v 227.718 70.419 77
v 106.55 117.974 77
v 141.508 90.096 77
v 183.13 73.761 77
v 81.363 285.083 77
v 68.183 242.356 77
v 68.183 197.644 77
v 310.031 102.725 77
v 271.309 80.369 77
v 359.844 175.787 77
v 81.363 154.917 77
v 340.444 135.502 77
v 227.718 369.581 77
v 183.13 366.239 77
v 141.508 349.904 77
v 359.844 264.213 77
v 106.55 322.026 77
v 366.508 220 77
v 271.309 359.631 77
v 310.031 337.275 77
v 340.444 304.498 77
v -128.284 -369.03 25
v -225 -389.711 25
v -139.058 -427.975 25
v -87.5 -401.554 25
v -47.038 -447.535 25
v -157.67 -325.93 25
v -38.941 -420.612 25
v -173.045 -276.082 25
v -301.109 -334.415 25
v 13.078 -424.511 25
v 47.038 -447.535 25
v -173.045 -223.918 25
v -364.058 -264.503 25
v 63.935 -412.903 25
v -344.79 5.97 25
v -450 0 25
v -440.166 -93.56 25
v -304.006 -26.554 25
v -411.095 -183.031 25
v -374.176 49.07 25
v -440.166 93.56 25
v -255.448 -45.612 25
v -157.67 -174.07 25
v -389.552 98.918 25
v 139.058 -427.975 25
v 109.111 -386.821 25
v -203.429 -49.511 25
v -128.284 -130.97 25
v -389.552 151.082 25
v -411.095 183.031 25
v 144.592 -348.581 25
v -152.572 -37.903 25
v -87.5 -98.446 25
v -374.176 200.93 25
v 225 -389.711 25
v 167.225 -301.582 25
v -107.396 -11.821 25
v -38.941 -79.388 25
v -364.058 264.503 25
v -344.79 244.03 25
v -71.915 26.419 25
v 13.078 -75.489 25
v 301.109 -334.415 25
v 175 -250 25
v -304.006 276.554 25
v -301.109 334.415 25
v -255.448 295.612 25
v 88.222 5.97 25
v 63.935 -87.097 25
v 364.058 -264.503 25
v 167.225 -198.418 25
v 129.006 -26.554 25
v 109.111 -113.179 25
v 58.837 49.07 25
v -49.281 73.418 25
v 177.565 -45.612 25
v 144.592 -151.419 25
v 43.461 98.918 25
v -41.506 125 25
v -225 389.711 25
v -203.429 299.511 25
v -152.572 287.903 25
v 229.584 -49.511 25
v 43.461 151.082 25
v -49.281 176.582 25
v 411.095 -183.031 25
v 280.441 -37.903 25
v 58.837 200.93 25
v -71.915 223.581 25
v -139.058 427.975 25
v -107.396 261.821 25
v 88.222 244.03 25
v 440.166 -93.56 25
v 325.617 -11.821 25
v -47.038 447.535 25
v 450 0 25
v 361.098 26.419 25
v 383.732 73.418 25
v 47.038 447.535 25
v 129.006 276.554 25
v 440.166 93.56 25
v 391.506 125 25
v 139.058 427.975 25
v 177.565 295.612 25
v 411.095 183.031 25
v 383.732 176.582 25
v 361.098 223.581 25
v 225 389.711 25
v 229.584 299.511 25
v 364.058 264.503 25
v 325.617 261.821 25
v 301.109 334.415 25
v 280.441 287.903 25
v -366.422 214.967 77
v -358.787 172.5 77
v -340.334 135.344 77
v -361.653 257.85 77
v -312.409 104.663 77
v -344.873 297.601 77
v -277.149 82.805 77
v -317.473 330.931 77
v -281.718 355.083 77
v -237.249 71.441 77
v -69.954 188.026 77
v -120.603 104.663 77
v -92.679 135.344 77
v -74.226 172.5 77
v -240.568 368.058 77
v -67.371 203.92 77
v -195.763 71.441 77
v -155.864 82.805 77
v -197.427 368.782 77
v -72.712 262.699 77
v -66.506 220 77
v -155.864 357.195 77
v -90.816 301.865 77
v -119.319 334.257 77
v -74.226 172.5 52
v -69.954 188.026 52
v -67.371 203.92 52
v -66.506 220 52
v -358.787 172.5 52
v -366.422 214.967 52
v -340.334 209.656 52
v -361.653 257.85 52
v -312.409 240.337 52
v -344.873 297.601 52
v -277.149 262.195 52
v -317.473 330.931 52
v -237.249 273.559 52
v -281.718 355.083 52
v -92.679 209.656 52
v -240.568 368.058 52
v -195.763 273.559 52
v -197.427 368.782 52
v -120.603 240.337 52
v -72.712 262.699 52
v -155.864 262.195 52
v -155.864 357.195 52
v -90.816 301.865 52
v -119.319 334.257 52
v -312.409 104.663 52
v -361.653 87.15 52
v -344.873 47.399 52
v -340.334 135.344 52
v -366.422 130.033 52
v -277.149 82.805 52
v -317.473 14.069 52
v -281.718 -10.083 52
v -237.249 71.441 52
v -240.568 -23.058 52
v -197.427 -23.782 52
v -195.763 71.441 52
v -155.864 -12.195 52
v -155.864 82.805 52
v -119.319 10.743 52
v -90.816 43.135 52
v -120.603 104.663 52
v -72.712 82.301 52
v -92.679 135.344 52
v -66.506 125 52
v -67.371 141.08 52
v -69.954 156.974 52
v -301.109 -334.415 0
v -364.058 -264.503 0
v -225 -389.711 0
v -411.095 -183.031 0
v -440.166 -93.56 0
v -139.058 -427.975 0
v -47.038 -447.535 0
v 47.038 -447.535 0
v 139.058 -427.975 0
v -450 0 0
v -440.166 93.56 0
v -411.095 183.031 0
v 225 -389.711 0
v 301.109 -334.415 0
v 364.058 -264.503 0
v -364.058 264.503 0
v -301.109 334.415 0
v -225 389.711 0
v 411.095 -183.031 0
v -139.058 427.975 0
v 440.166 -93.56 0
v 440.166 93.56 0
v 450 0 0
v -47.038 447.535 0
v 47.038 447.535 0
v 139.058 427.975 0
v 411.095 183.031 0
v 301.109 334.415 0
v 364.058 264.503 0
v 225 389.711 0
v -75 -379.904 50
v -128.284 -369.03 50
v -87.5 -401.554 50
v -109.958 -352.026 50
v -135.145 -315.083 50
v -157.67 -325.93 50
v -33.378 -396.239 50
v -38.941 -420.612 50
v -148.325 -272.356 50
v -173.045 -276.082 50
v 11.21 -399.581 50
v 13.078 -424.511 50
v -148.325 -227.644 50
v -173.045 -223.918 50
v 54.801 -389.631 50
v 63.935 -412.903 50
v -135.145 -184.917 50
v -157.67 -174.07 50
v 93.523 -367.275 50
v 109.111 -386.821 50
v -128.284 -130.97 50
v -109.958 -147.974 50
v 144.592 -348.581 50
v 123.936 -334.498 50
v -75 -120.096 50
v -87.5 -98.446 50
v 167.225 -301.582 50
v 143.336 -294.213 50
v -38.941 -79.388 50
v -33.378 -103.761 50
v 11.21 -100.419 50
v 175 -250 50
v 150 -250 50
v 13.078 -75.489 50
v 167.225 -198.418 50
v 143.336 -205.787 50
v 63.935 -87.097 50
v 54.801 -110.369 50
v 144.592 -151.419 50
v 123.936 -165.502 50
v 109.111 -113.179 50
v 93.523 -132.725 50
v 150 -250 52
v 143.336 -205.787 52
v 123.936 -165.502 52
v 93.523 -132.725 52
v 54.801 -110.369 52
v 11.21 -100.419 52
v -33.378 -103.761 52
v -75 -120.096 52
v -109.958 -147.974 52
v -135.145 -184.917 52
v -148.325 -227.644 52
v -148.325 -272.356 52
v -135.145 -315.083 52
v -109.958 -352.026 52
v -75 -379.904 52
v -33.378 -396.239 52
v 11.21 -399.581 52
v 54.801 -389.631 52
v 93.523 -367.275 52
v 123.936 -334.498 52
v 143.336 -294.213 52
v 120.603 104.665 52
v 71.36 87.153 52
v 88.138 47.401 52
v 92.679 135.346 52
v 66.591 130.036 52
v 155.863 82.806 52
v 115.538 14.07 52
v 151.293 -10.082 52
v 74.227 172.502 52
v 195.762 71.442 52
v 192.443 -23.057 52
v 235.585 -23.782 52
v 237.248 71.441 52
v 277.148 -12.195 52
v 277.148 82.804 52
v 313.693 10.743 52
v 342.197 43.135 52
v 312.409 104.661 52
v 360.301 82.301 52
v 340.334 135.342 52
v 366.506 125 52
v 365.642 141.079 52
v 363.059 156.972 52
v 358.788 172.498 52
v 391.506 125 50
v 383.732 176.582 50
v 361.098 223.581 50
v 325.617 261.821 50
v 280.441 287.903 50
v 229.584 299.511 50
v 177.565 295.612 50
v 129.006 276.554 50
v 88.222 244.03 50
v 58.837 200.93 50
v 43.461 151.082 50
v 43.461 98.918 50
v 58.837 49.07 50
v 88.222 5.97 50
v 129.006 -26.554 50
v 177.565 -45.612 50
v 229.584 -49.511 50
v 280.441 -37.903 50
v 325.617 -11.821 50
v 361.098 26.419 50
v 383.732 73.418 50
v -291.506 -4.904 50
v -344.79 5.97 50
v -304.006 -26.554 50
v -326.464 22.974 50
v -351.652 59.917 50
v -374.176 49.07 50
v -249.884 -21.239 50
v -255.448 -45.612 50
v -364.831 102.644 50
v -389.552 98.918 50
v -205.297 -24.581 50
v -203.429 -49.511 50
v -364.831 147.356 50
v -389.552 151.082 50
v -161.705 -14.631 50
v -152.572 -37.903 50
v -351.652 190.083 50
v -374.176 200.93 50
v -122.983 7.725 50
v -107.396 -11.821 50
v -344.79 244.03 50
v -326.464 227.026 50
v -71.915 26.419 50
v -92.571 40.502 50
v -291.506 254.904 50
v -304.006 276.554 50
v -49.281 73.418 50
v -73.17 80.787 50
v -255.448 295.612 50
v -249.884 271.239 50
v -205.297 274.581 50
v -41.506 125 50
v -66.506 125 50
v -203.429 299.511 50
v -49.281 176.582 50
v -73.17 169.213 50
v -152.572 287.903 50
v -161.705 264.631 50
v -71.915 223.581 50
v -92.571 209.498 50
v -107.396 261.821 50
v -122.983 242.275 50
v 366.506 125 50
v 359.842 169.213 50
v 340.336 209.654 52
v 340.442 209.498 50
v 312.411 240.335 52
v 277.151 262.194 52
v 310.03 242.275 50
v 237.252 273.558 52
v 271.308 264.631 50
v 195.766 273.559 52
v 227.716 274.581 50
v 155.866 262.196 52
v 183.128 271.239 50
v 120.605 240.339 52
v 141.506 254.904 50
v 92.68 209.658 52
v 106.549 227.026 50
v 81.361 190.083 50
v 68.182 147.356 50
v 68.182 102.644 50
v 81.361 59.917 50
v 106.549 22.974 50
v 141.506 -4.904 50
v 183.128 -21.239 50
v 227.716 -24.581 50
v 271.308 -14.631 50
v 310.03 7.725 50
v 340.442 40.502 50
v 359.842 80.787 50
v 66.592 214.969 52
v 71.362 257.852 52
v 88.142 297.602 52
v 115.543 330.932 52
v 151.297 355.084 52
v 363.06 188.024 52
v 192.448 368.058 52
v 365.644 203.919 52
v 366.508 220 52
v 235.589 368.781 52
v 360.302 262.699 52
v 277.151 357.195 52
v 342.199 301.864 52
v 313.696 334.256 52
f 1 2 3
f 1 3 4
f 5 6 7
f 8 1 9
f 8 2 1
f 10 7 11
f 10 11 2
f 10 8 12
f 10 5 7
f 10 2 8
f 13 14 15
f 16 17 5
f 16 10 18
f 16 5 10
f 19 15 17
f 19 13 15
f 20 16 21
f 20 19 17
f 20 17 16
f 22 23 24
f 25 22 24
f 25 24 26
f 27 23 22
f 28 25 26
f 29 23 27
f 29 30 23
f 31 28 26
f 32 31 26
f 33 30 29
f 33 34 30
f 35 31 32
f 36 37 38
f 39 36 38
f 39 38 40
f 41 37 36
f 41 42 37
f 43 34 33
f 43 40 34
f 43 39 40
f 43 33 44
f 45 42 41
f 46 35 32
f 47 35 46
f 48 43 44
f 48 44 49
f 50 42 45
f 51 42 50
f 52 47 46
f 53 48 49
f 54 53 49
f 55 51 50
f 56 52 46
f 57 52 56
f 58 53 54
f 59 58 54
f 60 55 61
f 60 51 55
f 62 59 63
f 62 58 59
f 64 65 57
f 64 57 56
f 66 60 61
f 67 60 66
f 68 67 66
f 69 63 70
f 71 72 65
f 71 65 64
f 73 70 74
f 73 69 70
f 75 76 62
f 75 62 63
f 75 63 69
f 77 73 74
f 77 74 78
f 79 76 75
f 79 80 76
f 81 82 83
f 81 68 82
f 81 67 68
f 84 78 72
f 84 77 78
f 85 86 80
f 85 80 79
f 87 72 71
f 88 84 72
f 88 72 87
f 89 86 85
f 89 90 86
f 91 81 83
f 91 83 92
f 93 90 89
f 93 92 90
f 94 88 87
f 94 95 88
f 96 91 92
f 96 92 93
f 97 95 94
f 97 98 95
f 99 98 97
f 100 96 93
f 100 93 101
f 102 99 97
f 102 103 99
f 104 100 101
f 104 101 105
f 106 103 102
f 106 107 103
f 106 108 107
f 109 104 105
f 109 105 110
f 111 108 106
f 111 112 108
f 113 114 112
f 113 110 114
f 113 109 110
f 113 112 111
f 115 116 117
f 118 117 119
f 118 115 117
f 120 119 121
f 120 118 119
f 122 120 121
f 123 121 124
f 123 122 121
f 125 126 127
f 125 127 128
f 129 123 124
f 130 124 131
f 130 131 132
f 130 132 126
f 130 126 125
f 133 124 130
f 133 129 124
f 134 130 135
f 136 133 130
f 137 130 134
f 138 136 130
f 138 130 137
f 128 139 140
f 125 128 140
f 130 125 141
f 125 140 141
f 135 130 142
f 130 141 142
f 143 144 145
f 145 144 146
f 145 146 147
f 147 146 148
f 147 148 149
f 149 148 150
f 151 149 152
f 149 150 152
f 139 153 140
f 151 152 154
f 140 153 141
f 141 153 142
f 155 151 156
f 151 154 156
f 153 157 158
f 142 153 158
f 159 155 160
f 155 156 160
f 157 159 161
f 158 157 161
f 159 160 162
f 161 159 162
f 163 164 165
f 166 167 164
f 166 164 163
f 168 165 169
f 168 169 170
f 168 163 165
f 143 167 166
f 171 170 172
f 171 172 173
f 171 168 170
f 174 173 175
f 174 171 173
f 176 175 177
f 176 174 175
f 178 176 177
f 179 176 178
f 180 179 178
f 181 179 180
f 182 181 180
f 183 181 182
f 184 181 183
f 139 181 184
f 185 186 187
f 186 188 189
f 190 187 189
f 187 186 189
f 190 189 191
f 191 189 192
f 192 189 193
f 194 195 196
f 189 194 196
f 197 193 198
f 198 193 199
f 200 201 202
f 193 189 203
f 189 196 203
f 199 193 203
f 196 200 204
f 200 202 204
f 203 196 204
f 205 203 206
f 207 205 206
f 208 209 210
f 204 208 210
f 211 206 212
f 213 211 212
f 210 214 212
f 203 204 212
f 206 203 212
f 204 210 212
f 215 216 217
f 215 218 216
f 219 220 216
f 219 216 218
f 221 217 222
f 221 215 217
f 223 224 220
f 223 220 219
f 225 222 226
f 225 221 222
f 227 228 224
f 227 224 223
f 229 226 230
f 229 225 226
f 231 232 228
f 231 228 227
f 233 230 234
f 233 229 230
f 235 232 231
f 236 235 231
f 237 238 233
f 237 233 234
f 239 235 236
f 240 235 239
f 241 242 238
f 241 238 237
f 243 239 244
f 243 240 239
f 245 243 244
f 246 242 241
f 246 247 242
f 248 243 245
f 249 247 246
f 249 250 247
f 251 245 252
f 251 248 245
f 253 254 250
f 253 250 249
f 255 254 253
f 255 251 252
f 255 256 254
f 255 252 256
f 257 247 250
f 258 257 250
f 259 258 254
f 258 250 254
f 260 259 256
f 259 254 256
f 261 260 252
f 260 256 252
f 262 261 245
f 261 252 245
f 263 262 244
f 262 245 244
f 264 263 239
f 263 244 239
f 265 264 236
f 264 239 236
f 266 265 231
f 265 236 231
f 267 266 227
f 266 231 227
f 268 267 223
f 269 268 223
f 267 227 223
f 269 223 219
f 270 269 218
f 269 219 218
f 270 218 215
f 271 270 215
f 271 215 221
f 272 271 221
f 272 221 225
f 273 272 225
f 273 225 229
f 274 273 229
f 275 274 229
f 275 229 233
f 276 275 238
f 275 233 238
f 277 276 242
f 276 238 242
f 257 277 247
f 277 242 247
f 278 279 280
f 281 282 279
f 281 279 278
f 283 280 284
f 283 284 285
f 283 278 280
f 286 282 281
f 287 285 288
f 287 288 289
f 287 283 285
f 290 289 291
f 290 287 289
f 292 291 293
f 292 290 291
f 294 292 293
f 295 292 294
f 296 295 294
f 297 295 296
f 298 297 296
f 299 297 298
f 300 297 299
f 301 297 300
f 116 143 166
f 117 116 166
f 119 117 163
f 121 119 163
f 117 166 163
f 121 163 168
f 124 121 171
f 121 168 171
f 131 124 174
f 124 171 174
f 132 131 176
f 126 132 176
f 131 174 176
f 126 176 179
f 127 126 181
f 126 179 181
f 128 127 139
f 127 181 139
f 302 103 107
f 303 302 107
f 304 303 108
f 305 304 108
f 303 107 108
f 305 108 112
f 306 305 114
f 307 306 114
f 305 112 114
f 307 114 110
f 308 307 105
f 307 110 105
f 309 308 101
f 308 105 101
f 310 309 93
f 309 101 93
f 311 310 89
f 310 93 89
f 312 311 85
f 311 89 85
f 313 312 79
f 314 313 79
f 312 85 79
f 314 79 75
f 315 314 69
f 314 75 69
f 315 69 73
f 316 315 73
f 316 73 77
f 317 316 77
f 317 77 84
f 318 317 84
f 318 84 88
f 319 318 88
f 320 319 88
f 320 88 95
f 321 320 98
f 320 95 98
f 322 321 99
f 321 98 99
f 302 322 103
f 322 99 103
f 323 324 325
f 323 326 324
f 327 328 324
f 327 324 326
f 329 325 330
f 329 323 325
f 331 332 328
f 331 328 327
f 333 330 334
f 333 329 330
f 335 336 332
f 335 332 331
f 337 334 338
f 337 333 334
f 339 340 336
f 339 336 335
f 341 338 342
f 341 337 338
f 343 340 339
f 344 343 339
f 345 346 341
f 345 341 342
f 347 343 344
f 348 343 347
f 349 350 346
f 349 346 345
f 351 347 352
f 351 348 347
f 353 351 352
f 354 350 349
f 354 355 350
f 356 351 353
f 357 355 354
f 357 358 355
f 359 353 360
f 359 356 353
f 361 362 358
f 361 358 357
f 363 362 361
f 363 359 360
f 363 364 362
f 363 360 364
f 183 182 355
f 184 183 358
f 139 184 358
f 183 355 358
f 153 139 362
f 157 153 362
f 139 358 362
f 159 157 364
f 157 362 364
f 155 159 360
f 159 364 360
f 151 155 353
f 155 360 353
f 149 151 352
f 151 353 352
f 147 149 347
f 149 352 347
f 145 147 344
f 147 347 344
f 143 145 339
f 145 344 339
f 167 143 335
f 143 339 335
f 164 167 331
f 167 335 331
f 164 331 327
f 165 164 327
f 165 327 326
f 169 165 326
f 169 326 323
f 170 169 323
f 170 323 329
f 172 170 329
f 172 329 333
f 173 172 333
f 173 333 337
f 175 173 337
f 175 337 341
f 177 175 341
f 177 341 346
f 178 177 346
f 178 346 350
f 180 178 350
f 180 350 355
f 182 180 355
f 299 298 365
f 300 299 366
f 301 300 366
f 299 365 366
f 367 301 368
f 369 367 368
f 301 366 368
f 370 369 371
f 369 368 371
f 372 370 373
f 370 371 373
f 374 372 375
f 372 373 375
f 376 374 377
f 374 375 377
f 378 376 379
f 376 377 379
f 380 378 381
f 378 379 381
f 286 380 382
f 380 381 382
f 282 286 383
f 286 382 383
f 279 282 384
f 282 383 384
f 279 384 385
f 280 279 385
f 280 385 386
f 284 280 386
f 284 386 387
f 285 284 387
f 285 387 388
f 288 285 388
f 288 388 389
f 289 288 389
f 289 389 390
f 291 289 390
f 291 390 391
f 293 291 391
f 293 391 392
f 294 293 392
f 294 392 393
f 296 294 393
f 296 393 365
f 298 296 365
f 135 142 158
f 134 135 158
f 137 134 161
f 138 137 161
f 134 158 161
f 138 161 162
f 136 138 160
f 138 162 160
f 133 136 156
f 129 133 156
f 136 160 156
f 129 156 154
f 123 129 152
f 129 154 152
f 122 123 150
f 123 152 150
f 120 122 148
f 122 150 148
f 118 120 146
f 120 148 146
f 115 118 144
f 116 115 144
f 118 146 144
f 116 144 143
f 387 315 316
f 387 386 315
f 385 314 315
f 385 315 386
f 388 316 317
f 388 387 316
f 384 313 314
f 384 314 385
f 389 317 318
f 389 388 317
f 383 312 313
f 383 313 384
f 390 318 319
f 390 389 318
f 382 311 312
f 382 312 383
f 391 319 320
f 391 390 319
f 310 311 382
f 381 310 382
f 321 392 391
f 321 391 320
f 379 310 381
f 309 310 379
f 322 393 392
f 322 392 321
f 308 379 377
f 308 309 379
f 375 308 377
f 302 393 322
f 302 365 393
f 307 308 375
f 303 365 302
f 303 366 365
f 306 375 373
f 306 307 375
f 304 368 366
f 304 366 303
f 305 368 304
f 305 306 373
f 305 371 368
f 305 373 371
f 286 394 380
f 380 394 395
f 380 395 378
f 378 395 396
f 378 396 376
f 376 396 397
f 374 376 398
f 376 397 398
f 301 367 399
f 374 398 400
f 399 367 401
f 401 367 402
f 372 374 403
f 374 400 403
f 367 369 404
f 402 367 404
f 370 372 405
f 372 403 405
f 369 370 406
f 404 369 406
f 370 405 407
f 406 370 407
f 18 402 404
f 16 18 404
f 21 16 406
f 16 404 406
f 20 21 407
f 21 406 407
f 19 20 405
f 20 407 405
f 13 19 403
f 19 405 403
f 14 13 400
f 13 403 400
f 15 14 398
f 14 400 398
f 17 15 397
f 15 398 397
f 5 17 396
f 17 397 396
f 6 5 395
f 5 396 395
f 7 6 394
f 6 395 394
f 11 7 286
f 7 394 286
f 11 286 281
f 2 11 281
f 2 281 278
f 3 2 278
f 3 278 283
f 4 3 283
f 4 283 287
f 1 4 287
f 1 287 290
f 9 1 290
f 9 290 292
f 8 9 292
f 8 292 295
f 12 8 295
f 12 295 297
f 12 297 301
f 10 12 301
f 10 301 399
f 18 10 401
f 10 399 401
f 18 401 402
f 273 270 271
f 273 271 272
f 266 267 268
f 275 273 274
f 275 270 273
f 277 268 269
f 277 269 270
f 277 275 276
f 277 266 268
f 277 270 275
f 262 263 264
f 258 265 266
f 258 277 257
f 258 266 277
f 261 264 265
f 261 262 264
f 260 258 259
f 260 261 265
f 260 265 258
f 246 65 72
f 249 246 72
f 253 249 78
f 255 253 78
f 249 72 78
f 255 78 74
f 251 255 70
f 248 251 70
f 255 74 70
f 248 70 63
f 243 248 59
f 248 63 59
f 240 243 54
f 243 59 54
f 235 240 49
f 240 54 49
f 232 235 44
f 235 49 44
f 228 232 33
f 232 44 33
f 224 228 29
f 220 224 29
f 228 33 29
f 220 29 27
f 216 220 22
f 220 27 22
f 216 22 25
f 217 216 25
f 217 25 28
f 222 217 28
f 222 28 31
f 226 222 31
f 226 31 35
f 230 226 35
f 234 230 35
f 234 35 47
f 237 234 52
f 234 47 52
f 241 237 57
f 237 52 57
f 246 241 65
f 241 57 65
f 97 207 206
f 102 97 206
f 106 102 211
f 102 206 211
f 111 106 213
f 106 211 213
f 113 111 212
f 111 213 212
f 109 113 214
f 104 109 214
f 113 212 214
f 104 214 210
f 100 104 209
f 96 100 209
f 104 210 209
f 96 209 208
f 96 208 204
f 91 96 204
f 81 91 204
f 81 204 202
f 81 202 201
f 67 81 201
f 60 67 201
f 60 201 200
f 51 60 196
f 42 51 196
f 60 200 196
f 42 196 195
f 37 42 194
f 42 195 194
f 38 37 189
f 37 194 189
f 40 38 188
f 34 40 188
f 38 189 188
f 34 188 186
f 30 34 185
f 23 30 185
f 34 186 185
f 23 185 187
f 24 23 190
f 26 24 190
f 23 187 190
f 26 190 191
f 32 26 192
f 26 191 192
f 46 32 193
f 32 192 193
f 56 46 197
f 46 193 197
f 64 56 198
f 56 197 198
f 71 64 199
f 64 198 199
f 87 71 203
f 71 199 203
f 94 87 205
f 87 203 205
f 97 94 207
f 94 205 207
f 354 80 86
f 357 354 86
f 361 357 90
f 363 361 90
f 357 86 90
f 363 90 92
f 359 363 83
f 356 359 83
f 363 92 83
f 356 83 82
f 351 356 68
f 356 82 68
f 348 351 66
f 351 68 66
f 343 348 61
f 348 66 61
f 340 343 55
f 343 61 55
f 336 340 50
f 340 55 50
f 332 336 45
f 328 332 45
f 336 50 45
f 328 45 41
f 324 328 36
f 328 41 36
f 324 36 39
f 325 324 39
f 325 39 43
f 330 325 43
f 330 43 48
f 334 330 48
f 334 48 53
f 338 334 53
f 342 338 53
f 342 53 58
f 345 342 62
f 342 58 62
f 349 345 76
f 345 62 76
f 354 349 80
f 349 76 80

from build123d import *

# Parameters (mm, degrees)
F0_R     = 450
F1_DEPTH = 25
F2_R     = 175
F3_DEPTH = 25
F4_R     = 150
F5_DEPTH = 2
F6_R     = 150
F7_DEPTH = 25


with BuildPart() as f1:
    # F0 (on Top) → F1 (new body)
    with BuildSketch(Plane.XY):
        Circle(F0_R)
    extrude(amount=F1_DEPTH)

    # F2 (on face) → F3 (join)
    with BuildSketch(Plane.XY.offset(25)):
        with Locations((0, -250)):
            Circle(F2_R)
        with Locations((-216.506351, 125)):
            Circle(F2_R)
        with Locations((216.506351, 125)):
            Circle(F2_R)
    extrude(amount=F3_DEPTH)

    # F4 (on face) → F5 (join)
    with BuildSketch(Plane.XY.offset(50)):
        with Locations((-216.506351, 125)):
            Circle(F4_R)
        with Locations((216.506351, 125)):
            Circle(F4_R)
        with Locations((0, -250)):
            Circle(F4_R)
    extrude(amount=F5_DEPTH)

    # F6 (on face) → F7 (join)
    with BuildSketch(Plane.XY.offset(52)):
        with BuildLine():
            ThreePointArc((-74.225818, 172.5), (-68.448795, 195.938411), (-66.506351, 220))
            ThreePointArc((-66.506351, 220), (-240.567939, 368.057556), (-358.786884, 172.5))
            ThreePointArc((-358.786884, 172.5), (-216.506351, 275), (-74.225818, 172.5))
        make_face()
        with BuildLine():
            ThreePointArc((-74.225818, 172.5), (-216.506351, 275), (-358.786884, 172.5))
            ThreePointArc((-358.786884, 172.5), (-216.506351, 70), (-74.225818, 172.5))
        make_face()
        with Locations((216.508, 220)):
            Circle(F6_R)
    extrude(amount=F7_DEPTH)


solid = f1.part
